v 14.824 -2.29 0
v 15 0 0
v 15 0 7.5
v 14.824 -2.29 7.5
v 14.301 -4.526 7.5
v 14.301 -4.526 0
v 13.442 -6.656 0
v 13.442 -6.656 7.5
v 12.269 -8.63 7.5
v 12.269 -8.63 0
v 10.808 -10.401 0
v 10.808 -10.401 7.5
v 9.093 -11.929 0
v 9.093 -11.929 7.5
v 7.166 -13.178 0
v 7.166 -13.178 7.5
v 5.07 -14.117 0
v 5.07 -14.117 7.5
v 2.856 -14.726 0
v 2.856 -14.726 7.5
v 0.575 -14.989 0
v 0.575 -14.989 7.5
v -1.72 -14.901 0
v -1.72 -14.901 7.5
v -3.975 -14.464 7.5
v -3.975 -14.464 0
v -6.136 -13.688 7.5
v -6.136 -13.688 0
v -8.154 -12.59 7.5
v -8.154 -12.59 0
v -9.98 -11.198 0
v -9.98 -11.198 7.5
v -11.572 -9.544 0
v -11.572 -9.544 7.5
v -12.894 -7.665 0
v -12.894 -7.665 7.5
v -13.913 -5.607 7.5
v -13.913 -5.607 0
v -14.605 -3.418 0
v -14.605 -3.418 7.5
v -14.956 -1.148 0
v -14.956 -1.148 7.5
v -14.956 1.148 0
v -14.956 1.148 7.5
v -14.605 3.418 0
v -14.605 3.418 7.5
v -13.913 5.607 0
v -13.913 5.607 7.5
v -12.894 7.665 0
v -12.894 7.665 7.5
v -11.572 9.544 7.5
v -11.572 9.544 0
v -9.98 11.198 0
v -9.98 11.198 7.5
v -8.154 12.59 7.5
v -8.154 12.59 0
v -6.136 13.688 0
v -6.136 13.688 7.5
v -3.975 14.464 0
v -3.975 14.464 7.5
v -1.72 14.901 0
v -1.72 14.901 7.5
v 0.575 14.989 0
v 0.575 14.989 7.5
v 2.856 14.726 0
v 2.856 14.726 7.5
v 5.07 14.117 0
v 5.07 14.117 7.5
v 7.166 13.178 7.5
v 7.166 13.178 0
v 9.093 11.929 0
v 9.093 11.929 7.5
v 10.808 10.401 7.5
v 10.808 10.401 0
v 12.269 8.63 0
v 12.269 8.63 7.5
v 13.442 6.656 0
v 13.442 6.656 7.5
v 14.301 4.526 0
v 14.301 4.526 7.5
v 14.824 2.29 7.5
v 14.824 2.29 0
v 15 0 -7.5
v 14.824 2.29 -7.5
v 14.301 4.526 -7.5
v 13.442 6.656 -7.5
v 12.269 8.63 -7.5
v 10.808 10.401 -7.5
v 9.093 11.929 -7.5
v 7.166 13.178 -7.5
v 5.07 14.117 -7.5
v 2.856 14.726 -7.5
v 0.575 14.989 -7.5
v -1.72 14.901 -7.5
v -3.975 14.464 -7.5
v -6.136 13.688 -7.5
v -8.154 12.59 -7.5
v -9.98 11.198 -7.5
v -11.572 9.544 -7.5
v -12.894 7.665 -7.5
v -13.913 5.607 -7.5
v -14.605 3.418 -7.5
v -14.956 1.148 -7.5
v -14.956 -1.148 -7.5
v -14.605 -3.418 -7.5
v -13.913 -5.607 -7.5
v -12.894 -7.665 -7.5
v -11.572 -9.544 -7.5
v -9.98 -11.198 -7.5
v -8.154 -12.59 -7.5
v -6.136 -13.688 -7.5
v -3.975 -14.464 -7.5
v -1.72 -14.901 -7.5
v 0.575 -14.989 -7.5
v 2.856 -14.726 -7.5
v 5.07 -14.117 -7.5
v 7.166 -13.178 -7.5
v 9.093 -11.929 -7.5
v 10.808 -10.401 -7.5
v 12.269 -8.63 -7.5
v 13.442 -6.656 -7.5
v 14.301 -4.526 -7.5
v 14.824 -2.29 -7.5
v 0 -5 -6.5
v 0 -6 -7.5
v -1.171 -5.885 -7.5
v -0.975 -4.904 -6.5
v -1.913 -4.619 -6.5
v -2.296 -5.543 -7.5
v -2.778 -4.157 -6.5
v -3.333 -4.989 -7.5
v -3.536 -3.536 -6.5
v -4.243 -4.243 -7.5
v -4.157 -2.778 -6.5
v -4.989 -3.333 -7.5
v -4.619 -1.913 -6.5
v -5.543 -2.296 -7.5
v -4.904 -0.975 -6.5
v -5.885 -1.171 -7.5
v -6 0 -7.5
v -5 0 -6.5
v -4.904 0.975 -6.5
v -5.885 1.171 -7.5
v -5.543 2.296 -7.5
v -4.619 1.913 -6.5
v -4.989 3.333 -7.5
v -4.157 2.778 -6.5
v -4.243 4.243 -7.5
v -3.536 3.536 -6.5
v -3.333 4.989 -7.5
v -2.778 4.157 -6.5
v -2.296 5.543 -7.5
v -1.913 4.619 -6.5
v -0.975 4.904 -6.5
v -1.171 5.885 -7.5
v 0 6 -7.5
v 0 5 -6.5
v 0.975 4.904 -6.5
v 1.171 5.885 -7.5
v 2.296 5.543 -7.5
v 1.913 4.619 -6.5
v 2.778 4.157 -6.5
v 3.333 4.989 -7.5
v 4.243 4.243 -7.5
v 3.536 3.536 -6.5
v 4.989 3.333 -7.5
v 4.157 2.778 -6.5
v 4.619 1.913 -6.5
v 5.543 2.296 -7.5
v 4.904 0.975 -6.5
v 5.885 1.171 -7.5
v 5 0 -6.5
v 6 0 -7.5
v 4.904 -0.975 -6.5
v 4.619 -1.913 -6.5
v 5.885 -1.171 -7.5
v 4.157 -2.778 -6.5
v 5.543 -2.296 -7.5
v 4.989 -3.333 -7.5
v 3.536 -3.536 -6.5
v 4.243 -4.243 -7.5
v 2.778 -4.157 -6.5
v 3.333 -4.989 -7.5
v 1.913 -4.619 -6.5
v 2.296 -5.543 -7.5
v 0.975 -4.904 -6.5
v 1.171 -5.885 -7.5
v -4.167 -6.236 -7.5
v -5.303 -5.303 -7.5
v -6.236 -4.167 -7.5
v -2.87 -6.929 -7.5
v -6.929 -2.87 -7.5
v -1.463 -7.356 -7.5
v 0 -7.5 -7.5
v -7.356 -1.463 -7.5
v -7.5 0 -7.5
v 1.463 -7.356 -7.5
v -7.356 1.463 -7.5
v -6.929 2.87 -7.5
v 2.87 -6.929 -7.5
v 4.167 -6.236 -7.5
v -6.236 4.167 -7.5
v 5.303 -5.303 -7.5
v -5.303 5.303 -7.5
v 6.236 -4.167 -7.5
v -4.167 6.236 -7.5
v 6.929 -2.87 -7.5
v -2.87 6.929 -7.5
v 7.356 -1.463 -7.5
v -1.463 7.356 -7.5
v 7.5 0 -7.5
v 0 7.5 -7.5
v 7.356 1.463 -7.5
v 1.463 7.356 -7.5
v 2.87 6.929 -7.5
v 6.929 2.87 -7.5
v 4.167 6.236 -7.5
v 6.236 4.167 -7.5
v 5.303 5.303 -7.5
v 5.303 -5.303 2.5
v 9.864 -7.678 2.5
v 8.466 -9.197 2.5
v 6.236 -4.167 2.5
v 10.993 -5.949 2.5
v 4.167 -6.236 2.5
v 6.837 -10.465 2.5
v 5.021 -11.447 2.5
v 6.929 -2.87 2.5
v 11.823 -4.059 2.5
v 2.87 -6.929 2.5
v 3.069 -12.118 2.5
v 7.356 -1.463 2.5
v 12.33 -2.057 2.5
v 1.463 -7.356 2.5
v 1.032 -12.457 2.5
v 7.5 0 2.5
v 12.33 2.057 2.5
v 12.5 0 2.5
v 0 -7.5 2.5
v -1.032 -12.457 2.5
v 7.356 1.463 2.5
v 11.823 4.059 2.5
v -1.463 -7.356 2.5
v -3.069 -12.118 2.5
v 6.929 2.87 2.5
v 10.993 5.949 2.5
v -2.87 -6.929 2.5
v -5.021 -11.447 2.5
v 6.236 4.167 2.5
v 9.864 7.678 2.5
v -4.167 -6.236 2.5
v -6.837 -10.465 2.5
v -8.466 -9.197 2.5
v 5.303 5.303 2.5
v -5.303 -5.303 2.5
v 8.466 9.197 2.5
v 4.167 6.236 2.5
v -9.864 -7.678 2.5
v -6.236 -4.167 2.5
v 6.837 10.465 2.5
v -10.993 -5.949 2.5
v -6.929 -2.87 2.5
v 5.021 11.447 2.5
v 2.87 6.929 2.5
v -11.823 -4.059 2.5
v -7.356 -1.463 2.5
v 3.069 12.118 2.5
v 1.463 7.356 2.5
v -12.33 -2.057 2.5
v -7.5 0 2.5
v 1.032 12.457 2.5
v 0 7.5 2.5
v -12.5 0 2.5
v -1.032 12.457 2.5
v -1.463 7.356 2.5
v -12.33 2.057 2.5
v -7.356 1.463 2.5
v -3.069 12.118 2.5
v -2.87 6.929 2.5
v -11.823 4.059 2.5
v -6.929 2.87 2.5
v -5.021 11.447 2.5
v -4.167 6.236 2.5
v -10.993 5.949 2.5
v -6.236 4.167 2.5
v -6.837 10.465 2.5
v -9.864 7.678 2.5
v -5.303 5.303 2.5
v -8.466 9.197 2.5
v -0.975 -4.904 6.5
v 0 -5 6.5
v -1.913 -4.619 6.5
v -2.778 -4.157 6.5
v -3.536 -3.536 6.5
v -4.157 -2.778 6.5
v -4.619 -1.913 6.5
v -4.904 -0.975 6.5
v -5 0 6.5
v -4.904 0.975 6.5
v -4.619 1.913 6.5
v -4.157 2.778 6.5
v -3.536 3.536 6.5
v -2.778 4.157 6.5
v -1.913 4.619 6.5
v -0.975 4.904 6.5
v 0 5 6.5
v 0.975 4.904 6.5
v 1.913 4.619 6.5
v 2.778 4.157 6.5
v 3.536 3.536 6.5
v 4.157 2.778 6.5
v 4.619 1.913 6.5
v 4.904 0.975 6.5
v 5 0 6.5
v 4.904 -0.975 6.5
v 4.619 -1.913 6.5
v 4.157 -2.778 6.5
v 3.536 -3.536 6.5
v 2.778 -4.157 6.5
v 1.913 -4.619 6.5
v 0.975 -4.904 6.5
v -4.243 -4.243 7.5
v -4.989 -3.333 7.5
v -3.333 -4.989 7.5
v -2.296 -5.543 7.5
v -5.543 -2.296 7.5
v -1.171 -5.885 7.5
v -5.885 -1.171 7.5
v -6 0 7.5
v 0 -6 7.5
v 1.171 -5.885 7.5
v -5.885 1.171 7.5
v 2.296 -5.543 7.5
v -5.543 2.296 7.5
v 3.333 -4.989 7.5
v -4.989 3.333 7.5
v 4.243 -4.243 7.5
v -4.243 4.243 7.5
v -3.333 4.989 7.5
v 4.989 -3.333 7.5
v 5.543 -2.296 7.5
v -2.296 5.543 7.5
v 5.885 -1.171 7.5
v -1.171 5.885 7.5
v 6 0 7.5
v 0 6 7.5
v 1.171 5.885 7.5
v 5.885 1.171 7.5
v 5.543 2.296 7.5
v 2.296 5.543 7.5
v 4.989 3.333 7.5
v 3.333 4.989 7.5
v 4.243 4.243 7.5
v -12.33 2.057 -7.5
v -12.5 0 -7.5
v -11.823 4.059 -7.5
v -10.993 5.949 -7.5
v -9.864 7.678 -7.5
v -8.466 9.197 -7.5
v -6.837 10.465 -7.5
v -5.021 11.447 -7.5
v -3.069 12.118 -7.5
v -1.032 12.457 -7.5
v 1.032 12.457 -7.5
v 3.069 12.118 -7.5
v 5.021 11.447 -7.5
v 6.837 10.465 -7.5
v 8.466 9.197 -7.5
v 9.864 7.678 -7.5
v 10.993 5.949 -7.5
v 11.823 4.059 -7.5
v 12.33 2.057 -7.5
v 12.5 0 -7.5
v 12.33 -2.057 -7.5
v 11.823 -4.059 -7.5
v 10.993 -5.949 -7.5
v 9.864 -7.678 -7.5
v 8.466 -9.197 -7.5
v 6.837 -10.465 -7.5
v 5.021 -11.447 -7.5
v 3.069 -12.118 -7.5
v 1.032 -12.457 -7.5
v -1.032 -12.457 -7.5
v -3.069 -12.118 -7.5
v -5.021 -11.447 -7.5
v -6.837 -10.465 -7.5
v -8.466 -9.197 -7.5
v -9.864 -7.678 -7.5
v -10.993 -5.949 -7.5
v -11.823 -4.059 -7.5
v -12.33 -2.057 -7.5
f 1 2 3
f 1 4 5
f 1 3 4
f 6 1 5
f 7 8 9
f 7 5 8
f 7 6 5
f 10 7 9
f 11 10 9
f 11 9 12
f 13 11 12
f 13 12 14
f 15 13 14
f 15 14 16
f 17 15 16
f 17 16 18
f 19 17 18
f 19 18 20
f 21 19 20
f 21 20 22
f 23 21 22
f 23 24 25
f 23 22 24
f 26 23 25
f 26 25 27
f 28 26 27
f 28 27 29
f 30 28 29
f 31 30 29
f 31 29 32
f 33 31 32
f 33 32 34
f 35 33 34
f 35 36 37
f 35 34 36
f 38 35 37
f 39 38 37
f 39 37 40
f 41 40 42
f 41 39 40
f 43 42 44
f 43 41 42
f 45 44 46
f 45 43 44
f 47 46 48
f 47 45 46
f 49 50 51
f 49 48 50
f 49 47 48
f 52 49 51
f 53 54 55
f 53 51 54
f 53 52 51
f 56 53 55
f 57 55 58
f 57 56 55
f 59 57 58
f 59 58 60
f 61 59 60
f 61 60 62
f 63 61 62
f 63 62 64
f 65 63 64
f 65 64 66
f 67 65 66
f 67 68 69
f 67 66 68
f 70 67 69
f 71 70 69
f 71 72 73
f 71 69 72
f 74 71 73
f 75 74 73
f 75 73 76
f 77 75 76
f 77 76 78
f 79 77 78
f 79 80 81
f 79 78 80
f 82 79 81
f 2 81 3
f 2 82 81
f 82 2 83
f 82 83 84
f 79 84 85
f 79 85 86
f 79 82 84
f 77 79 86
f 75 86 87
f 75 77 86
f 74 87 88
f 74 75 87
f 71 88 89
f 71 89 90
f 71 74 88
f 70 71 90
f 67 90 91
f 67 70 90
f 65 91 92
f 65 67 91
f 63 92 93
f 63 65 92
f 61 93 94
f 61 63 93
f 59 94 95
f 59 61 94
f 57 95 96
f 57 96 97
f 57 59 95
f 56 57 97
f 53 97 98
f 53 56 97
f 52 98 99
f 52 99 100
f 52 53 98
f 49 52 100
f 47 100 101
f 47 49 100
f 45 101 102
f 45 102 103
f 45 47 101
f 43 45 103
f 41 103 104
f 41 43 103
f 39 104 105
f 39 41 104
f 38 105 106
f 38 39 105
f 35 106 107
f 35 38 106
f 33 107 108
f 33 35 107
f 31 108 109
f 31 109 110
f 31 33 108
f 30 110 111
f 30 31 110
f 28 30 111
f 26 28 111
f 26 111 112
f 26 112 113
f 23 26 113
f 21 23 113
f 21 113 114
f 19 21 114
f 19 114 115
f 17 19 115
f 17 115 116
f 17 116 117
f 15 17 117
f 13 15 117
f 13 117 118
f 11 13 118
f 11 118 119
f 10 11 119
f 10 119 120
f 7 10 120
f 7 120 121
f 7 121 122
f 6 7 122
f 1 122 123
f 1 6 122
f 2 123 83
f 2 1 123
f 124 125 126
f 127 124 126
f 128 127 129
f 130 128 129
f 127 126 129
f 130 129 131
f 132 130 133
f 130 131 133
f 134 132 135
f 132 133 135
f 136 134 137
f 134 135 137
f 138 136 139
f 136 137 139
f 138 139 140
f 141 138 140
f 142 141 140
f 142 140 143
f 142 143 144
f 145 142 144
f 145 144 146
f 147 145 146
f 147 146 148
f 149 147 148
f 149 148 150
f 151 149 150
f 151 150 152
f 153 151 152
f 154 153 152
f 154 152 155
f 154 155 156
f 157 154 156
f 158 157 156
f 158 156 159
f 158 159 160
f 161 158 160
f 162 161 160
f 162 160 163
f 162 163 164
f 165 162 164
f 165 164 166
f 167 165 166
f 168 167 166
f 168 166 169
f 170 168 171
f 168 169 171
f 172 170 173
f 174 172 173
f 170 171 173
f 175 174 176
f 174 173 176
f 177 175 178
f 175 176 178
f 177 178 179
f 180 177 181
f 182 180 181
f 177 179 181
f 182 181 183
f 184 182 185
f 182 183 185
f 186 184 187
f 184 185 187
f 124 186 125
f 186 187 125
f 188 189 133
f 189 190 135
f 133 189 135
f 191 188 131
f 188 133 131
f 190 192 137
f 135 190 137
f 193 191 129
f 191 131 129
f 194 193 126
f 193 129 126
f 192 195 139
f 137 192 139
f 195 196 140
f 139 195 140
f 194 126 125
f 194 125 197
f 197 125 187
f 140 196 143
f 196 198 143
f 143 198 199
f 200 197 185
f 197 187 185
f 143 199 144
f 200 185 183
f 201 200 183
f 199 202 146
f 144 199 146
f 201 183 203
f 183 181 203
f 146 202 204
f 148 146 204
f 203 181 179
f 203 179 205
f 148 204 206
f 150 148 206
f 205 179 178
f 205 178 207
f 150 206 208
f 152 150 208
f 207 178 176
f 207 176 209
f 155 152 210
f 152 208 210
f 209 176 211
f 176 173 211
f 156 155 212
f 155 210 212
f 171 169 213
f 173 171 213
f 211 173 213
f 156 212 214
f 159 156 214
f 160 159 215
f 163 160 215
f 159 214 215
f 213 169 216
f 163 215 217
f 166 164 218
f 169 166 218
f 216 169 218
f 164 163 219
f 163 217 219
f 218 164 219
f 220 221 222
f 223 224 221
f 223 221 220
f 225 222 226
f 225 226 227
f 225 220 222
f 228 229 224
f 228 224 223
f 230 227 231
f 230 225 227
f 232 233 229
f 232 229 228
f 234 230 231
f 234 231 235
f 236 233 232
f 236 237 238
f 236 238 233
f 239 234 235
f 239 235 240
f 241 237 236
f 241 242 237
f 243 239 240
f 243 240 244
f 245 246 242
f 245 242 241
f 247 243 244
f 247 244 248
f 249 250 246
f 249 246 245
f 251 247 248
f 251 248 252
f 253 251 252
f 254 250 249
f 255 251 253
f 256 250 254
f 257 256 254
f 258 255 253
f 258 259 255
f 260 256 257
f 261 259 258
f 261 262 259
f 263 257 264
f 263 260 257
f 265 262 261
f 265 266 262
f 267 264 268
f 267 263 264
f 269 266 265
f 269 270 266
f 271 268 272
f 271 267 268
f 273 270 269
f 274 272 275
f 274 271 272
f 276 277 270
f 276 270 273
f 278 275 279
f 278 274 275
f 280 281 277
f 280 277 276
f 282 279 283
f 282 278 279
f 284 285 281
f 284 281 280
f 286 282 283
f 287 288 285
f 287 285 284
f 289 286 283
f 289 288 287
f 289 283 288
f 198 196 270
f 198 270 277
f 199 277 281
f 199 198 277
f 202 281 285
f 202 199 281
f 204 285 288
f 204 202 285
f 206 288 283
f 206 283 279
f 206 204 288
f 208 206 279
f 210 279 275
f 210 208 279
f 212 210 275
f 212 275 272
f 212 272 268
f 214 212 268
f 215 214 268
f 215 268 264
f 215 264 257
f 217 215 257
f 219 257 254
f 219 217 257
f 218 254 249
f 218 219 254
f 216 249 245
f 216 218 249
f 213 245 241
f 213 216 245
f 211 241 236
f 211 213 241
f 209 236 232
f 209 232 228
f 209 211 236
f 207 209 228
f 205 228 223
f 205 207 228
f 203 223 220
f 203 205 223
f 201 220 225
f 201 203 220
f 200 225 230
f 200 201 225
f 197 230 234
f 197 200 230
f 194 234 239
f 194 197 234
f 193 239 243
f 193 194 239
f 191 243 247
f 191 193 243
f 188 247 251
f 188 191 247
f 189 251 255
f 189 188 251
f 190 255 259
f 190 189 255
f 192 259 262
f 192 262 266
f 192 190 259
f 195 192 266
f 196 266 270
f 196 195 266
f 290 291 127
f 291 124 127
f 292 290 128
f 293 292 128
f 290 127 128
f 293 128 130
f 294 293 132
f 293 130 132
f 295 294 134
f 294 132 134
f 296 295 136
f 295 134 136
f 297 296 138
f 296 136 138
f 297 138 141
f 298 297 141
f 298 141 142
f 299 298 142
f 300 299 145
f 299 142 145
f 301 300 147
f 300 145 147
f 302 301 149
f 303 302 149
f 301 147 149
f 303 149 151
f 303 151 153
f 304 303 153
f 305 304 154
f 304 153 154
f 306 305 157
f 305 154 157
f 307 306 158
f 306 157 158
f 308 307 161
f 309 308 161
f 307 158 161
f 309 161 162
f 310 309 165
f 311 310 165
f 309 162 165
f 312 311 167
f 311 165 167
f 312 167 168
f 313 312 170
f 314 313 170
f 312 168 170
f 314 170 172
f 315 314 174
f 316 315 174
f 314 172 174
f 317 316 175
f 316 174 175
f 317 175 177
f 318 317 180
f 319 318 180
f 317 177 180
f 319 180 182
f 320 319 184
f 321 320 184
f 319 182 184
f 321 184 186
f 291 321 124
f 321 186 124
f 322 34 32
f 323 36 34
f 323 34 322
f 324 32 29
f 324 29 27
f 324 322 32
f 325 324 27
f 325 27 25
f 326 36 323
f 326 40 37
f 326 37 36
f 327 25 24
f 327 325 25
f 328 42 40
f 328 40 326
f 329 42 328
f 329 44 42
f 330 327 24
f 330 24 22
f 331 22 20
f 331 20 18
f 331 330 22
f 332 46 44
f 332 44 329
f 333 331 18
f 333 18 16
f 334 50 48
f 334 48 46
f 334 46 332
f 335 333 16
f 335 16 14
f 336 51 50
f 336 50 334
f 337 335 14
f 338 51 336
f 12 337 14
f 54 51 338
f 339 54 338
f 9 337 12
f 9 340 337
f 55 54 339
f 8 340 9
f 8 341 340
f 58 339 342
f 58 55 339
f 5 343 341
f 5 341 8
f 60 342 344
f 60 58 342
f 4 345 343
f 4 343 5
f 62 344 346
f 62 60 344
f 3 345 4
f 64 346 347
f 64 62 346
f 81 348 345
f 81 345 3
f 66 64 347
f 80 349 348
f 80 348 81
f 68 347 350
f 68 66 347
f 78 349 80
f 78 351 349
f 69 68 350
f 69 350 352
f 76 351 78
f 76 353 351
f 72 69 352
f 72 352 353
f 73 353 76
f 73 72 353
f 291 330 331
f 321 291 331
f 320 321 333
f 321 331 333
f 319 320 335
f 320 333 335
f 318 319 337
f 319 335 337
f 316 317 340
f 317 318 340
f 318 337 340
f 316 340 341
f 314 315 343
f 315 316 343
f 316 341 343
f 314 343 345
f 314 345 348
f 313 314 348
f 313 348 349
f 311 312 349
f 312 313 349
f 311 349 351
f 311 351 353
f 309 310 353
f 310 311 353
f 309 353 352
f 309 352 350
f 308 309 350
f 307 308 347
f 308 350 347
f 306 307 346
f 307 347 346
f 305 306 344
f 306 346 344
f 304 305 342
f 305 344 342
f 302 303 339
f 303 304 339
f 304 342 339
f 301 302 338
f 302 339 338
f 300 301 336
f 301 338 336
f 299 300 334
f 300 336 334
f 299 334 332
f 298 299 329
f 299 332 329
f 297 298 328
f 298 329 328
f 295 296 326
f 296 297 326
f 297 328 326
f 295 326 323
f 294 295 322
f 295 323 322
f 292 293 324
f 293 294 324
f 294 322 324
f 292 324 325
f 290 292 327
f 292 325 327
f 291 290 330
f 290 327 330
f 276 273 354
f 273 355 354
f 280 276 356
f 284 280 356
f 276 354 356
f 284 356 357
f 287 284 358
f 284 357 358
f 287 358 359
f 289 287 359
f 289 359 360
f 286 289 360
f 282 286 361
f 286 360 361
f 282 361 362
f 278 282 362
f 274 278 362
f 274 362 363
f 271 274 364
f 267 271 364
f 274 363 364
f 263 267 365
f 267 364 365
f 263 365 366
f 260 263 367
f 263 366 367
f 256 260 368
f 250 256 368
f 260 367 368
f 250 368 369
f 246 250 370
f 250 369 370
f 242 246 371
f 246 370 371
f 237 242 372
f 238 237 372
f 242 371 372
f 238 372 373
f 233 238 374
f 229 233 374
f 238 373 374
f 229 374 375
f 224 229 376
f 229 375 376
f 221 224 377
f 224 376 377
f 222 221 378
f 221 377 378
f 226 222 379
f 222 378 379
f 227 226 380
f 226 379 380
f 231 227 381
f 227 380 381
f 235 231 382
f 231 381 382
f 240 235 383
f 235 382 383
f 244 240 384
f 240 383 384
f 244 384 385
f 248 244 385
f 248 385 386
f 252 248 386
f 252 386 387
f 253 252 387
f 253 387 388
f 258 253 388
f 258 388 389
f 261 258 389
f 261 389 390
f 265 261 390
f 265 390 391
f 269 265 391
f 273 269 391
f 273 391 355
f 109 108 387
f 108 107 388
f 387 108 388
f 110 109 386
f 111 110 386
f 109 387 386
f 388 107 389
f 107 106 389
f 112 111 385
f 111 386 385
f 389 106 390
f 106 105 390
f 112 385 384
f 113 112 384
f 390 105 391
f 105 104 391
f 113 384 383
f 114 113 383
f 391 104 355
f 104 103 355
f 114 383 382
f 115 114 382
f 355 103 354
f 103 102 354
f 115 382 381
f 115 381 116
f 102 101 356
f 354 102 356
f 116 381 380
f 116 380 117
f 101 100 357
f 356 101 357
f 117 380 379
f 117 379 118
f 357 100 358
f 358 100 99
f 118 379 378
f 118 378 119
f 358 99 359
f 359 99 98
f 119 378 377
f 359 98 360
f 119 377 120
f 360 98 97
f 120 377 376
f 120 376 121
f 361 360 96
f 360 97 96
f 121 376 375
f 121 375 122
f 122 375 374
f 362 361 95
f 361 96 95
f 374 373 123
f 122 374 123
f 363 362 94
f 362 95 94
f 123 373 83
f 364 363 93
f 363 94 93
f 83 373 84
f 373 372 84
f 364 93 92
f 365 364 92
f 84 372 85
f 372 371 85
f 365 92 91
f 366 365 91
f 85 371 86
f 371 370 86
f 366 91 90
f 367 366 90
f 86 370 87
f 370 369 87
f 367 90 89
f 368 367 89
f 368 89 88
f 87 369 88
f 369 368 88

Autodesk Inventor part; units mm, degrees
ref_plane "YZ Plane" through (0, 0, 0) normal (1, 0, 0) x (0, 1, 0)
ref_plane "XZ Plane" through (0, 0, 0) normal (0, 1, 0) x (-1, 0, 0)
ref_plane "XY Plane" through (0, 0, 0) normal (0, 0, 1) x (1, 0, 0)
sketch "Skizze1" plane through (0, 0, 0) normal (0, 0, 1) x (1, 0, 0)
  circle A0 centre (0, 0) radius 15
  dimension "d0" = 30
extrude "Extrusion1" add sketch "Skizze1" along normal mid plane 15
sketch "Skizze2" plane through (0, 0, 7.5) normal (0, 0, 1) x (1, 0, 0)
  point P0 (0, 0)
  point P1 (0, 0)
hole "Bohrung1" at (0, 0, 7.5) direction (0, 0, -1) diameter 10 end through all
chamfer "Fasen1" distance 1 angle 45 2 edges at (0, 5, 7.5) (0, 5, -7.5)
sketch "Skizze3" plane through (0, 0, -7.5) normal (0, 0, -1) x (-1, 0, 0)
  circle A0 centre (0, 0) radius 12.5
  circle A1 centre (0, 0) radius 7.5
  dimension "d13" = 25
  dimension "d14" = 15
extrude "Extrusion2" cut sketch "Skizze3" against normal blind 10
equation "\"d0\" = Gleitbuchse_Aussendurchmesser"
equation "\"d1\" = Hoehe_Buchse"
equation "\"d3\" = Gleitbuchse_Innendurchmesser"
equation "\"d10\" = Fase"
equation "\"d13\" = Feder_aussen"
equation "\"d14\" = Feder_innen"
equation "\"d15\" = Federfuehrung_Tiefe"
equation "\"Gleitbuchse_Aussendurchmesser\" = 30"
equation "\"Gleitbuchse_Innendurchmesser\" = 10"
equation "\"Hoehe_Buchse\" = 15"
equation "\"Fase\" = 1"
equation "\"Federfuehrung_Tiefe\" = 10"
equation "\"Feder_aussen\" = 25"
equation "\"Feder_innen\" = 15"
properties part number "TS_Magazin_Gleitbuchse_int"
